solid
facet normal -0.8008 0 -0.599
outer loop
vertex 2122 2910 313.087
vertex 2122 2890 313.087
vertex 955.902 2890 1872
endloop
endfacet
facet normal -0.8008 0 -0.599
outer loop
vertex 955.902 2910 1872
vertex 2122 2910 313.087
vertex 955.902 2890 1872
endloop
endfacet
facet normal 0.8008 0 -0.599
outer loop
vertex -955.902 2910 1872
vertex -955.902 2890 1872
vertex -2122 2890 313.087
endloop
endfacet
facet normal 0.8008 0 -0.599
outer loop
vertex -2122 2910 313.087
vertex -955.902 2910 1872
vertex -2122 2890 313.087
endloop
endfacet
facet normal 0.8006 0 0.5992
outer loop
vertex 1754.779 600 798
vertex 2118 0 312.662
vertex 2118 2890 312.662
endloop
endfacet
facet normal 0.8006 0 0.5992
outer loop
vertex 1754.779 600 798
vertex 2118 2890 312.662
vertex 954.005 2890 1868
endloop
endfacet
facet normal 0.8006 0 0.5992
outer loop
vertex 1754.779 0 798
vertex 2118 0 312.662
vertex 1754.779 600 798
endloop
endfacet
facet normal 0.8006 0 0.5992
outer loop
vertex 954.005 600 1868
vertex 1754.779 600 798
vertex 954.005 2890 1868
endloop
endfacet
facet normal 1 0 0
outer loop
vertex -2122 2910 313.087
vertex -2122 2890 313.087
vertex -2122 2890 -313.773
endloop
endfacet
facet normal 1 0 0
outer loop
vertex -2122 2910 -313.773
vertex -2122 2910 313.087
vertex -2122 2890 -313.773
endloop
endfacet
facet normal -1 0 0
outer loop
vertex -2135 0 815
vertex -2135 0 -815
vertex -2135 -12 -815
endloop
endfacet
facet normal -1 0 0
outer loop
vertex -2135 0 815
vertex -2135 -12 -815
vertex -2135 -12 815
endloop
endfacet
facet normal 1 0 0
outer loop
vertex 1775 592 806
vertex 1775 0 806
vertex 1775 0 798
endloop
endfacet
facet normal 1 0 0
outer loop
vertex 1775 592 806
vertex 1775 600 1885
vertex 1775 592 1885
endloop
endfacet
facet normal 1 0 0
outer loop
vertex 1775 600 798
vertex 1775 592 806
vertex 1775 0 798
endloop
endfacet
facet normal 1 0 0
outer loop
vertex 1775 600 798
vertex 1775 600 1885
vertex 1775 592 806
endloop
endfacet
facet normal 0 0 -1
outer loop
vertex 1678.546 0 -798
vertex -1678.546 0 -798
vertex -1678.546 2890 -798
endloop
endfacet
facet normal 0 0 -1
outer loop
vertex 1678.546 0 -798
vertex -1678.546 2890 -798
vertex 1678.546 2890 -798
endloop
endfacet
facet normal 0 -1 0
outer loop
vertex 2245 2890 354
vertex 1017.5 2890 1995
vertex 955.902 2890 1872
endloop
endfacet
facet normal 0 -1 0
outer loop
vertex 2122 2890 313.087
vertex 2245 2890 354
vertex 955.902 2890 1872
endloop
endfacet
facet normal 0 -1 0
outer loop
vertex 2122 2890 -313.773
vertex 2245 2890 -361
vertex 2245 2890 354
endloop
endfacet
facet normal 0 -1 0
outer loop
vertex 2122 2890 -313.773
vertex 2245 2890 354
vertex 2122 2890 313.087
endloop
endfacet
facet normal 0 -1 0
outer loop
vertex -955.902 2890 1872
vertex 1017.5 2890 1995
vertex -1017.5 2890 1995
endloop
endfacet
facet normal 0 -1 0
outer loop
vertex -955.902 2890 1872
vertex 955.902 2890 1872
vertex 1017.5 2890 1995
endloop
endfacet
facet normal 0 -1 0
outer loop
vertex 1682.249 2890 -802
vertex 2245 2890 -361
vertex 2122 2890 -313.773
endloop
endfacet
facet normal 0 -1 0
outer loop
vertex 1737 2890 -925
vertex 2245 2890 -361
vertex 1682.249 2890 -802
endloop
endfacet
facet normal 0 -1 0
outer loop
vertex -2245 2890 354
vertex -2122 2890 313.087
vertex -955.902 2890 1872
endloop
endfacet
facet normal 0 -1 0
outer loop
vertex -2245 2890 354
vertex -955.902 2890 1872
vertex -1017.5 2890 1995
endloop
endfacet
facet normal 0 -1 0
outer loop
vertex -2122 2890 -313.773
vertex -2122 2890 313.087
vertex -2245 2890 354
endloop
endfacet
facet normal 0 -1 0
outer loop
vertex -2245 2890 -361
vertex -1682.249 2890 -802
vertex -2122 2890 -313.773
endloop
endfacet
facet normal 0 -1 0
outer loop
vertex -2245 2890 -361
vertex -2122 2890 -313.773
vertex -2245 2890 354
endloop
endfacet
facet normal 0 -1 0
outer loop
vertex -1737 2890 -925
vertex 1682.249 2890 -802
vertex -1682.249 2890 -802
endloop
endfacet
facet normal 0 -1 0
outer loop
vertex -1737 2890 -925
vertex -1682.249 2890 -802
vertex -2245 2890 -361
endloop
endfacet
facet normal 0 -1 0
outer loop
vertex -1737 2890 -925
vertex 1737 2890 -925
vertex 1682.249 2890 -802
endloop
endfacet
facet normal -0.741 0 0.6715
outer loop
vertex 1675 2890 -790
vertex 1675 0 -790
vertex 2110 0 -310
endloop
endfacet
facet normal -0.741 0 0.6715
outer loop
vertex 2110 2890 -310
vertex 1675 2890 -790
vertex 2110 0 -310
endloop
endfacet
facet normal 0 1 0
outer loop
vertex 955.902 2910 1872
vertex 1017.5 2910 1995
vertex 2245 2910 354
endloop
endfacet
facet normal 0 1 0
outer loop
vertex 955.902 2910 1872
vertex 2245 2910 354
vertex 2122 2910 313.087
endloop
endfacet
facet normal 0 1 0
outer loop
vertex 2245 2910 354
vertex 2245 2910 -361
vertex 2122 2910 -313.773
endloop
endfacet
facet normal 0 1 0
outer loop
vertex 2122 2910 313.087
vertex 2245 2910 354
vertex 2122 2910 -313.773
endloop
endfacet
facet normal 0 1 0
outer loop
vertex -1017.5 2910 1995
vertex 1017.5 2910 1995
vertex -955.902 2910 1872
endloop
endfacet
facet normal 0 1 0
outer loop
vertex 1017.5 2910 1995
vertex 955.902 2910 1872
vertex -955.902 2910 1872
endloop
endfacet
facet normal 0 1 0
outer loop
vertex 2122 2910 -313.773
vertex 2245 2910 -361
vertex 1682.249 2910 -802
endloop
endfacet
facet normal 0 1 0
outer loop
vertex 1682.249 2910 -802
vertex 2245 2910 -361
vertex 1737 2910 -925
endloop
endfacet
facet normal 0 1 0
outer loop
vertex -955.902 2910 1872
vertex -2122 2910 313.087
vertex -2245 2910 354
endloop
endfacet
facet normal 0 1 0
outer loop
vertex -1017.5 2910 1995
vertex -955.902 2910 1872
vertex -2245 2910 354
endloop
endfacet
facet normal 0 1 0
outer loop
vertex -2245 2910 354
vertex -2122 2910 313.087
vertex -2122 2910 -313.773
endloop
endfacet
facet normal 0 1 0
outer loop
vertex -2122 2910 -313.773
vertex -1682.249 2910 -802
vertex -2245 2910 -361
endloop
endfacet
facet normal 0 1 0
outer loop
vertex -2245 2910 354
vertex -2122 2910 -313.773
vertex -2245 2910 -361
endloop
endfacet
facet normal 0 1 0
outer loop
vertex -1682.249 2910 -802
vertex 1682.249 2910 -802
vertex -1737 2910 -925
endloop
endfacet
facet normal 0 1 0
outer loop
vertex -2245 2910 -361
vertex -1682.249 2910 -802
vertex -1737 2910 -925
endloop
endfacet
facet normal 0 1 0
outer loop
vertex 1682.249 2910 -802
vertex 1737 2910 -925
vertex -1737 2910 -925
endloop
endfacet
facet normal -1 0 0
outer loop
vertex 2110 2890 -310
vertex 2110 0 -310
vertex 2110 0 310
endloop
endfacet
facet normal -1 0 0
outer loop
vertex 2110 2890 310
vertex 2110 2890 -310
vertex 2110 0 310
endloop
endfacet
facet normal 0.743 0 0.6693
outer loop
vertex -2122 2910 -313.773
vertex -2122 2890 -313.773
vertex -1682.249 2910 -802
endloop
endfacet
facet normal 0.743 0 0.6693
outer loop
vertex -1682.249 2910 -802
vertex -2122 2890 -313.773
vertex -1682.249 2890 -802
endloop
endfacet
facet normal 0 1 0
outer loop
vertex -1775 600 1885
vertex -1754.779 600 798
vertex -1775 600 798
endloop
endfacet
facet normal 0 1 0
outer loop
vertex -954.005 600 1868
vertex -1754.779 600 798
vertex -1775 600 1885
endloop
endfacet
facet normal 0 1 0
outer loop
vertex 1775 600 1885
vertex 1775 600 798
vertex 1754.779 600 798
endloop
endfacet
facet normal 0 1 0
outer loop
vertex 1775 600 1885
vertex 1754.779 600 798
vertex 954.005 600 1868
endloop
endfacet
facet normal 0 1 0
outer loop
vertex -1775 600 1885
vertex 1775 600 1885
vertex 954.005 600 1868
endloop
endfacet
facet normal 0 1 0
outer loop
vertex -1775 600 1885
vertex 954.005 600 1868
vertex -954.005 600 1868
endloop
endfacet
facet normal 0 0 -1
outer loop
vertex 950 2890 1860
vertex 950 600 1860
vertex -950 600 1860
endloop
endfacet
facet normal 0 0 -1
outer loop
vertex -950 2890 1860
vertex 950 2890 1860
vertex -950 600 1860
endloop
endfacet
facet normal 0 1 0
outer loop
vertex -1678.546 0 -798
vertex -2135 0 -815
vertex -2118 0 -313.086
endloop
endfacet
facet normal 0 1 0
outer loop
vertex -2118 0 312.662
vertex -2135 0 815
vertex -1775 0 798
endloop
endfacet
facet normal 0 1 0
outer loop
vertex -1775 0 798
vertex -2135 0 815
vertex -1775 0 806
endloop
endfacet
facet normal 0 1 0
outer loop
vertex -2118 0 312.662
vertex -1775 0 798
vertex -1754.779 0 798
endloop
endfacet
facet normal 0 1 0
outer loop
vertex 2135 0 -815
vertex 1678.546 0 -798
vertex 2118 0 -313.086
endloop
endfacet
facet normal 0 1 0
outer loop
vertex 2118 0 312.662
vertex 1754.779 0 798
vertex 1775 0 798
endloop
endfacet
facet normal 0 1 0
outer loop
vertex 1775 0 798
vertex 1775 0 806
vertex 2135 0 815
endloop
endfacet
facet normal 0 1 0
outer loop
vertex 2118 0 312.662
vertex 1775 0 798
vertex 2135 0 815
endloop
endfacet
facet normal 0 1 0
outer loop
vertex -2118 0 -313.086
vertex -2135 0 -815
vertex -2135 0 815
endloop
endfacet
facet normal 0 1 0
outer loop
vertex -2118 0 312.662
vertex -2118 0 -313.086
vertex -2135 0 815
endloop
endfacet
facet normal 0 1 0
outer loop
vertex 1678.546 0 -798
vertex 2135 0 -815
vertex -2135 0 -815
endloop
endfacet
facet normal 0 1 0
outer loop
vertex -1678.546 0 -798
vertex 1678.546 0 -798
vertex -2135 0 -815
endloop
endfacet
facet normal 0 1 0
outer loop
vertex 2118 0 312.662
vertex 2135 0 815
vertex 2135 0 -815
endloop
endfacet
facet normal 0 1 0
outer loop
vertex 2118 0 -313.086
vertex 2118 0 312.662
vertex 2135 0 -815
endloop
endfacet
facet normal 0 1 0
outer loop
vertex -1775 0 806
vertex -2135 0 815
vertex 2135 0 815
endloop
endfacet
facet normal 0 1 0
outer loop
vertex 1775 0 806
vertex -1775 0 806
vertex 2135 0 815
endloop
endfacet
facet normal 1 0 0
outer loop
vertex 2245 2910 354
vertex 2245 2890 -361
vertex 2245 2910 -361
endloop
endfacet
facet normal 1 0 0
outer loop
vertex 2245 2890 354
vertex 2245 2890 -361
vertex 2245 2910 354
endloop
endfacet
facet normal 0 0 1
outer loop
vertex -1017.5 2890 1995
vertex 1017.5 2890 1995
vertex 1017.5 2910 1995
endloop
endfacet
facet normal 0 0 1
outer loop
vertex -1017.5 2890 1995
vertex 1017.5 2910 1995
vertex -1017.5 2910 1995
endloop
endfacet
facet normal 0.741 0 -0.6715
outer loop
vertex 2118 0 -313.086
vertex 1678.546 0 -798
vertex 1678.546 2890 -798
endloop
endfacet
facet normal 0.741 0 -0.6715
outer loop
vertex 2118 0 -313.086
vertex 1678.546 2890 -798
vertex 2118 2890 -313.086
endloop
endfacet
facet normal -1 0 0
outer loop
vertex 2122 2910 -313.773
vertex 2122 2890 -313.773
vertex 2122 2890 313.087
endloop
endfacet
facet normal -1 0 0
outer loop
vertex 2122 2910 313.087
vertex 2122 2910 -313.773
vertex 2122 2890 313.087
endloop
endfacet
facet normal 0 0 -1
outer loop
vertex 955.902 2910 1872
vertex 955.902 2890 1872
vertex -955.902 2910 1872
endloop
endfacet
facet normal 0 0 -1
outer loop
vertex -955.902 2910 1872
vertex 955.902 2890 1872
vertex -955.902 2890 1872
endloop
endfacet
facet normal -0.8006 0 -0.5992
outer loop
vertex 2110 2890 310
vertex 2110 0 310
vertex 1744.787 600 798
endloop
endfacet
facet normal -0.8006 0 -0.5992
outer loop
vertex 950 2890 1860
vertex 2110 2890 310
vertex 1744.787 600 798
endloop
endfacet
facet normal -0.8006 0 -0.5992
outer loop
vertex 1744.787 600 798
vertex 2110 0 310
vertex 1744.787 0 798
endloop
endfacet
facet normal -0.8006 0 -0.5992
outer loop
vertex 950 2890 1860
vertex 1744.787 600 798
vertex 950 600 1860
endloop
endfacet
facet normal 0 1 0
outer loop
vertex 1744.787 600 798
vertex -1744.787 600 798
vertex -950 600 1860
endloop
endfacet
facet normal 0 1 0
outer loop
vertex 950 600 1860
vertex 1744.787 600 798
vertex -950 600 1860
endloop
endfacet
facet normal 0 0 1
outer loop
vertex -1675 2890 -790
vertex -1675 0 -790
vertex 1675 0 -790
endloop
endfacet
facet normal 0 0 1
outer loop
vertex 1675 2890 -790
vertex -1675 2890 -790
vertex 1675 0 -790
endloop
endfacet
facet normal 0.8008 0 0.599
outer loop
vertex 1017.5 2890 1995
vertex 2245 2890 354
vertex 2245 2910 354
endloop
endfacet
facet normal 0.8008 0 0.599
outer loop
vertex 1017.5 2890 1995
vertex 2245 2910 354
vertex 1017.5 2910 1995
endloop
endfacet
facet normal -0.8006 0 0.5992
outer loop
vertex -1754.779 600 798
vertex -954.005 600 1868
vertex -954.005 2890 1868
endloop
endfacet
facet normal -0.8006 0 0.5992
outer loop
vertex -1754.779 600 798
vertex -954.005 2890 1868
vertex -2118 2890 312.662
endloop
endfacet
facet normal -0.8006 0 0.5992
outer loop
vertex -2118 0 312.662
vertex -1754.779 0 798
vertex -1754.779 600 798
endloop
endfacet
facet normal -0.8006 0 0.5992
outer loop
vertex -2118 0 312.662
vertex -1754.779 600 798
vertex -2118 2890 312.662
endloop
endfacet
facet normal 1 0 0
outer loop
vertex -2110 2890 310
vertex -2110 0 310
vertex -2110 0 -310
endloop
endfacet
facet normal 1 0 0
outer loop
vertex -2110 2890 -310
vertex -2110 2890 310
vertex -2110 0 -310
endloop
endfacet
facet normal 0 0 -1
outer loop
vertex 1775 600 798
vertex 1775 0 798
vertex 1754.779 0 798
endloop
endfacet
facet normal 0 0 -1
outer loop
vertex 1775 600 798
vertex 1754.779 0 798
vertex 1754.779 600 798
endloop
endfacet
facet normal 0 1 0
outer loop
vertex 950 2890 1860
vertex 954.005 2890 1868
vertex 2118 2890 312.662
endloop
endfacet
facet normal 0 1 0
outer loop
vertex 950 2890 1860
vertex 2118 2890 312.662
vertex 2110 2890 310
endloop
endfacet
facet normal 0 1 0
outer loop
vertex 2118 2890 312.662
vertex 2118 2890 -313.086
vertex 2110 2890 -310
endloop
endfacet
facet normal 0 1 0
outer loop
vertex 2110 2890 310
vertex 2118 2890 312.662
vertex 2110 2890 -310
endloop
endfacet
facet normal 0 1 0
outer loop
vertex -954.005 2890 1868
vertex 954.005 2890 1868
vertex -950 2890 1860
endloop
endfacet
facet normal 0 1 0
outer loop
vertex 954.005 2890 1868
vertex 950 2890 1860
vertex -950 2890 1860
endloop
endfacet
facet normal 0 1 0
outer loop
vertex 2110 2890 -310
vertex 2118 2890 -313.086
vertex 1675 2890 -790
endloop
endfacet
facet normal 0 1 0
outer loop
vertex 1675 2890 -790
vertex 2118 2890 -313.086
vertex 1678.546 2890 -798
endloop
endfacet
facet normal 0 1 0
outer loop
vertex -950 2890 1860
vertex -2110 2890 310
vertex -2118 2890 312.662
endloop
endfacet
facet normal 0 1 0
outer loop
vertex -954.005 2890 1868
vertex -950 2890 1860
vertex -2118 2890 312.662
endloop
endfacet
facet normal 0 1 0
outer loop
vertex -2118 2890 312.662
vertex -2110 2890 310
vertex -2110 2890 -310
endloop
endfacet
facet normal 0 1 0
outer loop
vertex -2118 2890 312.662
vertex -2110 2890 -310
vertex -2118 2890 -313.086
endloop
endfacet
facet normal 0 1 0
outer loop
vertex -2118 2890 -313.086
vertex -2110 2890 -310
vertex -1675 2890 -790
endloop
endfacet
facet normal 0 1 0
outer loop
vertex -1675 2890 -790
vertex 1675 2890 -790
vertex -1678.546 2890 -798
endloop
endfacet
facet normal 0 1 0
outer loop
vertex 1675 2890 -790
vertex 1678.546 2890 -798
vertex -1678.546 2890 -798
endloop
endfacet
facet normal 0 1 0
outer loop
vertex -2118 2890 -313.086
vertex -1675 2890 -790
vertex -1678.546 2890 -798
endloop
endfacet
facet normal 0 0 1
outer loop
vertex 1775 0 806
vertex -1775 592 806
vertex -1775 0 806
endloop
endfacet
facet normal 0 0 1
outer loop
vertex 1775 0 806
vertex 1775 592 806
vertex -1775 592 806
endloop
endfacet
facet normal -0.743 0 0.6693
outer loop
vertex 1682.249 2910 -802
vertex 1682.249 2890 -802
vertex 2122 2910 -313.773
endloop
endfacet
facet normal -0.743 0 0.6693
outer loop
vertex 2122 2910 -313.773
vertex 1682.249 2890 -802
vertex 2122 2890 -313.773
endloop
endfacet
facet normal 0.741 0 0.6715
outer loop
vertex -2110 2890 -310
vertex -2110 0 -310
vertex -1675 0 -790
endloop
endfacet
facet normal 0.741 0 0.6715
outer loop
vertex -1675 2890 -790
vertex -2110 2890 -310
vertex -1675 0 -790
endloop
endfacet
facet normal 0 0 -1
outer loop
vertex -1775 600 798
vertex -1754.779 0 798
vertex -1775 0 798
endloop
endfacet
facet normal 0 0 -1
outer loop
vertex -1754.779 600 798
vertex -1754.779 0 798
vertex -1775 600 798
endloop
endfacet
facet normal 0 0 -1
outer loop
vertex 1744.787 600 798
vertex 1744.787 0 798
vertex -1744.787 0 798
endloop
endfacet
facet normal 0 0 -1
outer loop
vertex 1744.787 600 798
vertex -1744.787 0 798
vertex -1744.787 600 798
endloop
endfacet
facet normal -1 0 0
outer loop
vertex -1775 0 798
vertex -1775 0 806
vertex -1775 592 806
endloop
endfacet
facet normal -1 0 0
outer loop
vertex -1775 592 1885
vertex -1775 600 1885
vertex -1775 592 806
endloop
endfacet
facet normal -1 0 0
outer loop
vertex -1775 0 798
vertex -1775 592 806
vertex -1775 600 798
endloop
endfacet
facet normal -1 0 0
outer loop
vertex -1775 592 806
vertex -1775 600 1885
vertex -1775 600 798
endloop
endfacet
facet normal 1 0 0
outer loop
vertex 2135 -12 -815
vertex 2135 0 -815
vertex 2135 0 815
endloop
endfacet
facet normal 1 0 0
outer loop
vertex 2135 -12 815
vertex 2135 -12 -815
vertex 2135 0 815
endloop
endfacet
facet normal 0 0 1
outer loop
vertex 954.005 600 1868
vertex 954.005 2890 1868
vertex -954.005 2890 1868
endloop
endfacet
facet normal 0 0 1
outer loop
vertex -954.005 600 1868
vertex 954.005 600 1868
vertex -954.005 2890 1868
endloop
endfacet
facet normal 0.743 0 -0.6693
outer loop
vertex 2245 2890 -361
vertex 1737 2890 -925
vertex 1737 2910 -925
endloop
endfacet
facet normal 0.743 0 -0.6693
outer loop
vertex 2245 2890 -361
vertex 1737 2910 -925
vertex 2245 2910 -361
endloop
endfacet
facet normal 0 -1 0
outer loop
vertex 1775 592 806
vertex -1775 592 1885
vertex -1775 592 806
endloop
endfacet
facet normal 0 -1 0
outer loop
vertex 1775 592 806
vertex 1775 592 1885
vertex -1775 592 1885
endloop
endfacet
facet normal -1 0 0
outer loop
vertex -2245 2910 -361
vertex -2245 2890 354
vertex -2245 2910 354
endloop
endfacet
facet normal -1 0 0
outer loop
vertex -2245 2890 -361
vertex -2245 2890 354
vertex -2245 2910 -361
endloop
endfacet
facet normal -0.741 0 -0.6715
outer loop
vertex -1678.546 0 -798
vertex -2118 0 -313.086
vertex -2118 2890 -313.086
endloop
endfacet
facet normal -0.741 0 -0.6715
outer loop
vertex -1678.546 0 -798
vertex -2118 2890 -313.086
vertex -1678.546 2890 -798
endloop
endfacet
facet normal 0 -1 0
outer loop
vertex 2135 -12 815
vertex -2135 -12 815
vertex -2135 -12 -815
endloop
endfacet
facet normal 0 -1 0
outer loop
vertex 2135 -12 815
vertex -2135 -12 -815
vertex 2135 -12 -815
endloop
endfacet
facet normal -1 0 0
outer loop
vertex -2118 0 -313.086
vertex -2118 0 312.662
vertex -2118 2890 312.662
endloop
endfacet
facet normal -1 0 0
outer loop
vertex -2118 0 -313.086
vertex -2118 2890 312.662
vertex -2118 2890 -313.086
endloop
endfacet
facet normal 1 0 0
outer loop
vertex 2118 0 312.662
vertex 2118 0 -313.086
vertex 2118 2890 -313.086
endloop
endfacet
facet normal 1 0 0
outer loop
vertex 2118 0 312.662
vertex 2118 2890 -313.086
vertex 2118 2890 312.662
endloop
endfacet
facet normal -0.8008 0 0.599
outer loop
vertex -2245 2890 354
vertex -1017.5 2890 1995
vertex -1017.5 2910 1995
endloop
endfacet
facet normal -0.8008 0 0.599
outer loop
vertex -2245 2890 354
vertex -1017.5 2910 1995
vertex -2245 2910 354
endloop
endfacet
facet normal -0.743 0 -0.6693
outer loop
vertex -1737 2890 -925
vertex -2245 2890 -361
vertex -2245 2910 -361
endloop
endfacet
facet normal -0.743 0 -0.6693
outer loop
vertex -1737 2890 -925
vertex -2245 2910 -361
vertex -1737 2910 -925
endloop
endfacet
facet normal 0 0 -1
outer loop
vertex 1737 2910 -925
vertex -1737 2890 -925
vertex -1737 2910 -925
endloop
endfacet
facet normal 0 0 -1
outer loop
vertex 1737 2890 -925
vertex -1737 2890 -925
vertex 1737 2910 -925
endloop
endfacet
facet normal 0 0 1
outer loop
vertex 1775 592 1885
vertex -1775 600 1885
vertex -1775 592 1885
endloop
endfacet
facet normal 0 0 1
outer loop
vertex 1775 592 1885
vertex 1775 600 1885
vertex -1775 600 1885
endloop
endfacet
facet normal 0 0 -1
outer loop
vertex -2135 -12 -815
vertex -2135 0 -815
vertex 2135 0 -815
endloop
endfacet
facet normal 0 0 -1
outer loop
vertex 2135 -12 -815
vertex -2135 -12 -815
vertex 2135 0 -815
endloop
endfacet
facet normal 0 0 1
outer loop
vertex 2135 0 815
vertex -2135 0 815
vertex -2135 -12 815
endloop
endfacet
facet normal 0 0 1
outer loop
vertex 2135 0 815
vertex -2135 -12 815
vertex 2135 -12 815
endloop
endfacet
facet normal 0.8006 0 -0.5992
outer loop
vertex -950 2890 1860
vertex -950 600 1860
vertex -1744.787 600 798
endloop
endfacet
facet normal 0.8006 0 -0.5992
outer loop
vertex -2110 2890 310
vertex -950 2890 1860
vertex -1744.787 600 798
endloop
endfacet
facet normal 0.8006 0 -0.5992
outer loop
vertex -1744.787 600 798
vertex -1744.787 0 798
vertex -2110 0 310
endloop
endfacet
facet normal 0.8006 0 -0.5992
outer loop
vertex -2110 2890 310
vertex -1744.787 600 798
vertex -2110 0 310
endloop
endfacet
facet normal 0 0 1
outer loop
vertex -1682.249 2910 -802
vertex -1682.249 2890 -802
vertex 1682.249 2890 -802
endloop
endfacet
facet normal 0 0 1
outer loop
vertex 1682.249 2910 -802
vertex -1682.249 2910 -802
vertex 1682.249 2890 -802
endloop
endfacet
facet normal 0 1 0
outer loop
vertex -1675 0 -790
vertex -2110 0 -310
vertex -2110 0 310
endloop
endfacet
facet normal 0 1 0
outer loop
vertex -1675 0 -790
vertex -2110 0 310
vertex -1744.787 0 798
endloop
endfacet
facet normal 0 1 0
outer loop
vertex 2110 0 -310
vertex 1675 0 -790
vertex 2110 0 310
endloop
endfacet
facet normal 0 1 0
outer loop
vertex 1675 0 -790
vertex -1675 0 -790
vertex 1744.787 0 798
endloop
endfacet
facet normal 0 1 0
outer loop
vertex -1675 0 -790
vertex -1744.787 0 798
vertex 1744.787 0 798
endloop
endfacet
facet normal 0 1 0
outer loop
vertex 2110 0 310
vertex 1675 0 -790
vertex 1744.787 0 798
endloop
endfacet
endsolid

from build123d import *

# Parameters (mm, degrees)
BOSS_EXTRUDE1_DEPTH = 2890
SKETCH2_W           = 4270
SKETCH2_H           = 1630
BOSS_EXTRUDE2_DEPTH = 12
SKETCH3_W           = 3666.559691054
SKETCH3_H           = 1200.183204927
CUT_EXTRUDE1_DEPTH  = 600
BOSS_EXTRUDE3_DEPTH = 1775
BOSS_EXTRUDE4_DEPTH = 20


with BuildPart() as part:
    # Sketch1 → Boss-Extrude1 (new body)
    with BuildSketch(Plane(origin=(0, 0, 0), x_dir=(1, 0, 0), z_dir=(0, 1, 0))):
        Polygon((-1678.546411441, 798), (1678.546411441, 798), (2118, 313.085695383), (2118, -312.66207609), (954.005166622, -1868), (-954.005166622, -1868), (-2118, -312.66207609), (-2118, 313.085695383), align=None)
        Polygon((-1675, 790), (1675, 790), (2110, 310), (2110, -310), (950, -1860), (-950, -1860), (-2110, -310), (-2110, 310), align=None, mode=Mode.SUBTRACT)
    extrude(amount=BOSS_EXTRUDE1_DEPTH)

    # Sketch2 → Boss-Extrude2 (add)
    with BuildSketch(Plane.XZ):
        Rectangle(SKETCH2_W, SKETCH2_H)
    extrude(amount=BOSS_EXTRUDE2_DEPTH)

    # Sketch3 → Cut-Extrude1 (cut)
    with BuildSketch(Plane.XZ):
        with Locations((75.079734907, 1398.091602464)):
            Rectangle(SKETCH3_W, SKETCH3_H)
    extrude(amount=-CUT_EXTRUDE1_DEPTH, mode=Mode.SUBTRACT)

    # Sketch4 → Boss-Extrude3 (add, symmetric)
    with BuildSketch(Plane(origin=(0, 0, 0), x_dir=(0, 0, -1), z_dir=(1, 0, 0))):
        Polygon((-806, 592), (-806, 0), (-798, 0), (-798, 600), (-1885, 600), (-1885, 592), align=None)
    extrude(amount=BOSS_EXTRUDE3_DEPTH, both=True)


with BuildPart() as body_2:
    # Sketch5 → Boss-Extrude4 (new body)
    with BuildSketch(Plane(origin=(0, 2890, 0), x_dir=(1, 0, 0), z_dir=(0, 1, 0))):
        Polygon((-1737, 925), (1737, 925), (2245, 361), (2245, -354), (1017.5, -1995), (-1017.5, -1995), (-2245, -354), (-2245, 361), align=None)
        Polygon((-1682.249289067, 802), (1682.249289067, 802), (2122, 313.772832743), (2122, -313.086677907), (955.90243579, -1872), (-955.90243579, -1872), (-2122, -313.086677907), (-2122, 313.772832743), align=None, mode=Mode.SUBTRACT)
    extrude(amount=BOSS_EXTRUDE4_DEPTH)


solid = Compound([part.part, body_2.part])
